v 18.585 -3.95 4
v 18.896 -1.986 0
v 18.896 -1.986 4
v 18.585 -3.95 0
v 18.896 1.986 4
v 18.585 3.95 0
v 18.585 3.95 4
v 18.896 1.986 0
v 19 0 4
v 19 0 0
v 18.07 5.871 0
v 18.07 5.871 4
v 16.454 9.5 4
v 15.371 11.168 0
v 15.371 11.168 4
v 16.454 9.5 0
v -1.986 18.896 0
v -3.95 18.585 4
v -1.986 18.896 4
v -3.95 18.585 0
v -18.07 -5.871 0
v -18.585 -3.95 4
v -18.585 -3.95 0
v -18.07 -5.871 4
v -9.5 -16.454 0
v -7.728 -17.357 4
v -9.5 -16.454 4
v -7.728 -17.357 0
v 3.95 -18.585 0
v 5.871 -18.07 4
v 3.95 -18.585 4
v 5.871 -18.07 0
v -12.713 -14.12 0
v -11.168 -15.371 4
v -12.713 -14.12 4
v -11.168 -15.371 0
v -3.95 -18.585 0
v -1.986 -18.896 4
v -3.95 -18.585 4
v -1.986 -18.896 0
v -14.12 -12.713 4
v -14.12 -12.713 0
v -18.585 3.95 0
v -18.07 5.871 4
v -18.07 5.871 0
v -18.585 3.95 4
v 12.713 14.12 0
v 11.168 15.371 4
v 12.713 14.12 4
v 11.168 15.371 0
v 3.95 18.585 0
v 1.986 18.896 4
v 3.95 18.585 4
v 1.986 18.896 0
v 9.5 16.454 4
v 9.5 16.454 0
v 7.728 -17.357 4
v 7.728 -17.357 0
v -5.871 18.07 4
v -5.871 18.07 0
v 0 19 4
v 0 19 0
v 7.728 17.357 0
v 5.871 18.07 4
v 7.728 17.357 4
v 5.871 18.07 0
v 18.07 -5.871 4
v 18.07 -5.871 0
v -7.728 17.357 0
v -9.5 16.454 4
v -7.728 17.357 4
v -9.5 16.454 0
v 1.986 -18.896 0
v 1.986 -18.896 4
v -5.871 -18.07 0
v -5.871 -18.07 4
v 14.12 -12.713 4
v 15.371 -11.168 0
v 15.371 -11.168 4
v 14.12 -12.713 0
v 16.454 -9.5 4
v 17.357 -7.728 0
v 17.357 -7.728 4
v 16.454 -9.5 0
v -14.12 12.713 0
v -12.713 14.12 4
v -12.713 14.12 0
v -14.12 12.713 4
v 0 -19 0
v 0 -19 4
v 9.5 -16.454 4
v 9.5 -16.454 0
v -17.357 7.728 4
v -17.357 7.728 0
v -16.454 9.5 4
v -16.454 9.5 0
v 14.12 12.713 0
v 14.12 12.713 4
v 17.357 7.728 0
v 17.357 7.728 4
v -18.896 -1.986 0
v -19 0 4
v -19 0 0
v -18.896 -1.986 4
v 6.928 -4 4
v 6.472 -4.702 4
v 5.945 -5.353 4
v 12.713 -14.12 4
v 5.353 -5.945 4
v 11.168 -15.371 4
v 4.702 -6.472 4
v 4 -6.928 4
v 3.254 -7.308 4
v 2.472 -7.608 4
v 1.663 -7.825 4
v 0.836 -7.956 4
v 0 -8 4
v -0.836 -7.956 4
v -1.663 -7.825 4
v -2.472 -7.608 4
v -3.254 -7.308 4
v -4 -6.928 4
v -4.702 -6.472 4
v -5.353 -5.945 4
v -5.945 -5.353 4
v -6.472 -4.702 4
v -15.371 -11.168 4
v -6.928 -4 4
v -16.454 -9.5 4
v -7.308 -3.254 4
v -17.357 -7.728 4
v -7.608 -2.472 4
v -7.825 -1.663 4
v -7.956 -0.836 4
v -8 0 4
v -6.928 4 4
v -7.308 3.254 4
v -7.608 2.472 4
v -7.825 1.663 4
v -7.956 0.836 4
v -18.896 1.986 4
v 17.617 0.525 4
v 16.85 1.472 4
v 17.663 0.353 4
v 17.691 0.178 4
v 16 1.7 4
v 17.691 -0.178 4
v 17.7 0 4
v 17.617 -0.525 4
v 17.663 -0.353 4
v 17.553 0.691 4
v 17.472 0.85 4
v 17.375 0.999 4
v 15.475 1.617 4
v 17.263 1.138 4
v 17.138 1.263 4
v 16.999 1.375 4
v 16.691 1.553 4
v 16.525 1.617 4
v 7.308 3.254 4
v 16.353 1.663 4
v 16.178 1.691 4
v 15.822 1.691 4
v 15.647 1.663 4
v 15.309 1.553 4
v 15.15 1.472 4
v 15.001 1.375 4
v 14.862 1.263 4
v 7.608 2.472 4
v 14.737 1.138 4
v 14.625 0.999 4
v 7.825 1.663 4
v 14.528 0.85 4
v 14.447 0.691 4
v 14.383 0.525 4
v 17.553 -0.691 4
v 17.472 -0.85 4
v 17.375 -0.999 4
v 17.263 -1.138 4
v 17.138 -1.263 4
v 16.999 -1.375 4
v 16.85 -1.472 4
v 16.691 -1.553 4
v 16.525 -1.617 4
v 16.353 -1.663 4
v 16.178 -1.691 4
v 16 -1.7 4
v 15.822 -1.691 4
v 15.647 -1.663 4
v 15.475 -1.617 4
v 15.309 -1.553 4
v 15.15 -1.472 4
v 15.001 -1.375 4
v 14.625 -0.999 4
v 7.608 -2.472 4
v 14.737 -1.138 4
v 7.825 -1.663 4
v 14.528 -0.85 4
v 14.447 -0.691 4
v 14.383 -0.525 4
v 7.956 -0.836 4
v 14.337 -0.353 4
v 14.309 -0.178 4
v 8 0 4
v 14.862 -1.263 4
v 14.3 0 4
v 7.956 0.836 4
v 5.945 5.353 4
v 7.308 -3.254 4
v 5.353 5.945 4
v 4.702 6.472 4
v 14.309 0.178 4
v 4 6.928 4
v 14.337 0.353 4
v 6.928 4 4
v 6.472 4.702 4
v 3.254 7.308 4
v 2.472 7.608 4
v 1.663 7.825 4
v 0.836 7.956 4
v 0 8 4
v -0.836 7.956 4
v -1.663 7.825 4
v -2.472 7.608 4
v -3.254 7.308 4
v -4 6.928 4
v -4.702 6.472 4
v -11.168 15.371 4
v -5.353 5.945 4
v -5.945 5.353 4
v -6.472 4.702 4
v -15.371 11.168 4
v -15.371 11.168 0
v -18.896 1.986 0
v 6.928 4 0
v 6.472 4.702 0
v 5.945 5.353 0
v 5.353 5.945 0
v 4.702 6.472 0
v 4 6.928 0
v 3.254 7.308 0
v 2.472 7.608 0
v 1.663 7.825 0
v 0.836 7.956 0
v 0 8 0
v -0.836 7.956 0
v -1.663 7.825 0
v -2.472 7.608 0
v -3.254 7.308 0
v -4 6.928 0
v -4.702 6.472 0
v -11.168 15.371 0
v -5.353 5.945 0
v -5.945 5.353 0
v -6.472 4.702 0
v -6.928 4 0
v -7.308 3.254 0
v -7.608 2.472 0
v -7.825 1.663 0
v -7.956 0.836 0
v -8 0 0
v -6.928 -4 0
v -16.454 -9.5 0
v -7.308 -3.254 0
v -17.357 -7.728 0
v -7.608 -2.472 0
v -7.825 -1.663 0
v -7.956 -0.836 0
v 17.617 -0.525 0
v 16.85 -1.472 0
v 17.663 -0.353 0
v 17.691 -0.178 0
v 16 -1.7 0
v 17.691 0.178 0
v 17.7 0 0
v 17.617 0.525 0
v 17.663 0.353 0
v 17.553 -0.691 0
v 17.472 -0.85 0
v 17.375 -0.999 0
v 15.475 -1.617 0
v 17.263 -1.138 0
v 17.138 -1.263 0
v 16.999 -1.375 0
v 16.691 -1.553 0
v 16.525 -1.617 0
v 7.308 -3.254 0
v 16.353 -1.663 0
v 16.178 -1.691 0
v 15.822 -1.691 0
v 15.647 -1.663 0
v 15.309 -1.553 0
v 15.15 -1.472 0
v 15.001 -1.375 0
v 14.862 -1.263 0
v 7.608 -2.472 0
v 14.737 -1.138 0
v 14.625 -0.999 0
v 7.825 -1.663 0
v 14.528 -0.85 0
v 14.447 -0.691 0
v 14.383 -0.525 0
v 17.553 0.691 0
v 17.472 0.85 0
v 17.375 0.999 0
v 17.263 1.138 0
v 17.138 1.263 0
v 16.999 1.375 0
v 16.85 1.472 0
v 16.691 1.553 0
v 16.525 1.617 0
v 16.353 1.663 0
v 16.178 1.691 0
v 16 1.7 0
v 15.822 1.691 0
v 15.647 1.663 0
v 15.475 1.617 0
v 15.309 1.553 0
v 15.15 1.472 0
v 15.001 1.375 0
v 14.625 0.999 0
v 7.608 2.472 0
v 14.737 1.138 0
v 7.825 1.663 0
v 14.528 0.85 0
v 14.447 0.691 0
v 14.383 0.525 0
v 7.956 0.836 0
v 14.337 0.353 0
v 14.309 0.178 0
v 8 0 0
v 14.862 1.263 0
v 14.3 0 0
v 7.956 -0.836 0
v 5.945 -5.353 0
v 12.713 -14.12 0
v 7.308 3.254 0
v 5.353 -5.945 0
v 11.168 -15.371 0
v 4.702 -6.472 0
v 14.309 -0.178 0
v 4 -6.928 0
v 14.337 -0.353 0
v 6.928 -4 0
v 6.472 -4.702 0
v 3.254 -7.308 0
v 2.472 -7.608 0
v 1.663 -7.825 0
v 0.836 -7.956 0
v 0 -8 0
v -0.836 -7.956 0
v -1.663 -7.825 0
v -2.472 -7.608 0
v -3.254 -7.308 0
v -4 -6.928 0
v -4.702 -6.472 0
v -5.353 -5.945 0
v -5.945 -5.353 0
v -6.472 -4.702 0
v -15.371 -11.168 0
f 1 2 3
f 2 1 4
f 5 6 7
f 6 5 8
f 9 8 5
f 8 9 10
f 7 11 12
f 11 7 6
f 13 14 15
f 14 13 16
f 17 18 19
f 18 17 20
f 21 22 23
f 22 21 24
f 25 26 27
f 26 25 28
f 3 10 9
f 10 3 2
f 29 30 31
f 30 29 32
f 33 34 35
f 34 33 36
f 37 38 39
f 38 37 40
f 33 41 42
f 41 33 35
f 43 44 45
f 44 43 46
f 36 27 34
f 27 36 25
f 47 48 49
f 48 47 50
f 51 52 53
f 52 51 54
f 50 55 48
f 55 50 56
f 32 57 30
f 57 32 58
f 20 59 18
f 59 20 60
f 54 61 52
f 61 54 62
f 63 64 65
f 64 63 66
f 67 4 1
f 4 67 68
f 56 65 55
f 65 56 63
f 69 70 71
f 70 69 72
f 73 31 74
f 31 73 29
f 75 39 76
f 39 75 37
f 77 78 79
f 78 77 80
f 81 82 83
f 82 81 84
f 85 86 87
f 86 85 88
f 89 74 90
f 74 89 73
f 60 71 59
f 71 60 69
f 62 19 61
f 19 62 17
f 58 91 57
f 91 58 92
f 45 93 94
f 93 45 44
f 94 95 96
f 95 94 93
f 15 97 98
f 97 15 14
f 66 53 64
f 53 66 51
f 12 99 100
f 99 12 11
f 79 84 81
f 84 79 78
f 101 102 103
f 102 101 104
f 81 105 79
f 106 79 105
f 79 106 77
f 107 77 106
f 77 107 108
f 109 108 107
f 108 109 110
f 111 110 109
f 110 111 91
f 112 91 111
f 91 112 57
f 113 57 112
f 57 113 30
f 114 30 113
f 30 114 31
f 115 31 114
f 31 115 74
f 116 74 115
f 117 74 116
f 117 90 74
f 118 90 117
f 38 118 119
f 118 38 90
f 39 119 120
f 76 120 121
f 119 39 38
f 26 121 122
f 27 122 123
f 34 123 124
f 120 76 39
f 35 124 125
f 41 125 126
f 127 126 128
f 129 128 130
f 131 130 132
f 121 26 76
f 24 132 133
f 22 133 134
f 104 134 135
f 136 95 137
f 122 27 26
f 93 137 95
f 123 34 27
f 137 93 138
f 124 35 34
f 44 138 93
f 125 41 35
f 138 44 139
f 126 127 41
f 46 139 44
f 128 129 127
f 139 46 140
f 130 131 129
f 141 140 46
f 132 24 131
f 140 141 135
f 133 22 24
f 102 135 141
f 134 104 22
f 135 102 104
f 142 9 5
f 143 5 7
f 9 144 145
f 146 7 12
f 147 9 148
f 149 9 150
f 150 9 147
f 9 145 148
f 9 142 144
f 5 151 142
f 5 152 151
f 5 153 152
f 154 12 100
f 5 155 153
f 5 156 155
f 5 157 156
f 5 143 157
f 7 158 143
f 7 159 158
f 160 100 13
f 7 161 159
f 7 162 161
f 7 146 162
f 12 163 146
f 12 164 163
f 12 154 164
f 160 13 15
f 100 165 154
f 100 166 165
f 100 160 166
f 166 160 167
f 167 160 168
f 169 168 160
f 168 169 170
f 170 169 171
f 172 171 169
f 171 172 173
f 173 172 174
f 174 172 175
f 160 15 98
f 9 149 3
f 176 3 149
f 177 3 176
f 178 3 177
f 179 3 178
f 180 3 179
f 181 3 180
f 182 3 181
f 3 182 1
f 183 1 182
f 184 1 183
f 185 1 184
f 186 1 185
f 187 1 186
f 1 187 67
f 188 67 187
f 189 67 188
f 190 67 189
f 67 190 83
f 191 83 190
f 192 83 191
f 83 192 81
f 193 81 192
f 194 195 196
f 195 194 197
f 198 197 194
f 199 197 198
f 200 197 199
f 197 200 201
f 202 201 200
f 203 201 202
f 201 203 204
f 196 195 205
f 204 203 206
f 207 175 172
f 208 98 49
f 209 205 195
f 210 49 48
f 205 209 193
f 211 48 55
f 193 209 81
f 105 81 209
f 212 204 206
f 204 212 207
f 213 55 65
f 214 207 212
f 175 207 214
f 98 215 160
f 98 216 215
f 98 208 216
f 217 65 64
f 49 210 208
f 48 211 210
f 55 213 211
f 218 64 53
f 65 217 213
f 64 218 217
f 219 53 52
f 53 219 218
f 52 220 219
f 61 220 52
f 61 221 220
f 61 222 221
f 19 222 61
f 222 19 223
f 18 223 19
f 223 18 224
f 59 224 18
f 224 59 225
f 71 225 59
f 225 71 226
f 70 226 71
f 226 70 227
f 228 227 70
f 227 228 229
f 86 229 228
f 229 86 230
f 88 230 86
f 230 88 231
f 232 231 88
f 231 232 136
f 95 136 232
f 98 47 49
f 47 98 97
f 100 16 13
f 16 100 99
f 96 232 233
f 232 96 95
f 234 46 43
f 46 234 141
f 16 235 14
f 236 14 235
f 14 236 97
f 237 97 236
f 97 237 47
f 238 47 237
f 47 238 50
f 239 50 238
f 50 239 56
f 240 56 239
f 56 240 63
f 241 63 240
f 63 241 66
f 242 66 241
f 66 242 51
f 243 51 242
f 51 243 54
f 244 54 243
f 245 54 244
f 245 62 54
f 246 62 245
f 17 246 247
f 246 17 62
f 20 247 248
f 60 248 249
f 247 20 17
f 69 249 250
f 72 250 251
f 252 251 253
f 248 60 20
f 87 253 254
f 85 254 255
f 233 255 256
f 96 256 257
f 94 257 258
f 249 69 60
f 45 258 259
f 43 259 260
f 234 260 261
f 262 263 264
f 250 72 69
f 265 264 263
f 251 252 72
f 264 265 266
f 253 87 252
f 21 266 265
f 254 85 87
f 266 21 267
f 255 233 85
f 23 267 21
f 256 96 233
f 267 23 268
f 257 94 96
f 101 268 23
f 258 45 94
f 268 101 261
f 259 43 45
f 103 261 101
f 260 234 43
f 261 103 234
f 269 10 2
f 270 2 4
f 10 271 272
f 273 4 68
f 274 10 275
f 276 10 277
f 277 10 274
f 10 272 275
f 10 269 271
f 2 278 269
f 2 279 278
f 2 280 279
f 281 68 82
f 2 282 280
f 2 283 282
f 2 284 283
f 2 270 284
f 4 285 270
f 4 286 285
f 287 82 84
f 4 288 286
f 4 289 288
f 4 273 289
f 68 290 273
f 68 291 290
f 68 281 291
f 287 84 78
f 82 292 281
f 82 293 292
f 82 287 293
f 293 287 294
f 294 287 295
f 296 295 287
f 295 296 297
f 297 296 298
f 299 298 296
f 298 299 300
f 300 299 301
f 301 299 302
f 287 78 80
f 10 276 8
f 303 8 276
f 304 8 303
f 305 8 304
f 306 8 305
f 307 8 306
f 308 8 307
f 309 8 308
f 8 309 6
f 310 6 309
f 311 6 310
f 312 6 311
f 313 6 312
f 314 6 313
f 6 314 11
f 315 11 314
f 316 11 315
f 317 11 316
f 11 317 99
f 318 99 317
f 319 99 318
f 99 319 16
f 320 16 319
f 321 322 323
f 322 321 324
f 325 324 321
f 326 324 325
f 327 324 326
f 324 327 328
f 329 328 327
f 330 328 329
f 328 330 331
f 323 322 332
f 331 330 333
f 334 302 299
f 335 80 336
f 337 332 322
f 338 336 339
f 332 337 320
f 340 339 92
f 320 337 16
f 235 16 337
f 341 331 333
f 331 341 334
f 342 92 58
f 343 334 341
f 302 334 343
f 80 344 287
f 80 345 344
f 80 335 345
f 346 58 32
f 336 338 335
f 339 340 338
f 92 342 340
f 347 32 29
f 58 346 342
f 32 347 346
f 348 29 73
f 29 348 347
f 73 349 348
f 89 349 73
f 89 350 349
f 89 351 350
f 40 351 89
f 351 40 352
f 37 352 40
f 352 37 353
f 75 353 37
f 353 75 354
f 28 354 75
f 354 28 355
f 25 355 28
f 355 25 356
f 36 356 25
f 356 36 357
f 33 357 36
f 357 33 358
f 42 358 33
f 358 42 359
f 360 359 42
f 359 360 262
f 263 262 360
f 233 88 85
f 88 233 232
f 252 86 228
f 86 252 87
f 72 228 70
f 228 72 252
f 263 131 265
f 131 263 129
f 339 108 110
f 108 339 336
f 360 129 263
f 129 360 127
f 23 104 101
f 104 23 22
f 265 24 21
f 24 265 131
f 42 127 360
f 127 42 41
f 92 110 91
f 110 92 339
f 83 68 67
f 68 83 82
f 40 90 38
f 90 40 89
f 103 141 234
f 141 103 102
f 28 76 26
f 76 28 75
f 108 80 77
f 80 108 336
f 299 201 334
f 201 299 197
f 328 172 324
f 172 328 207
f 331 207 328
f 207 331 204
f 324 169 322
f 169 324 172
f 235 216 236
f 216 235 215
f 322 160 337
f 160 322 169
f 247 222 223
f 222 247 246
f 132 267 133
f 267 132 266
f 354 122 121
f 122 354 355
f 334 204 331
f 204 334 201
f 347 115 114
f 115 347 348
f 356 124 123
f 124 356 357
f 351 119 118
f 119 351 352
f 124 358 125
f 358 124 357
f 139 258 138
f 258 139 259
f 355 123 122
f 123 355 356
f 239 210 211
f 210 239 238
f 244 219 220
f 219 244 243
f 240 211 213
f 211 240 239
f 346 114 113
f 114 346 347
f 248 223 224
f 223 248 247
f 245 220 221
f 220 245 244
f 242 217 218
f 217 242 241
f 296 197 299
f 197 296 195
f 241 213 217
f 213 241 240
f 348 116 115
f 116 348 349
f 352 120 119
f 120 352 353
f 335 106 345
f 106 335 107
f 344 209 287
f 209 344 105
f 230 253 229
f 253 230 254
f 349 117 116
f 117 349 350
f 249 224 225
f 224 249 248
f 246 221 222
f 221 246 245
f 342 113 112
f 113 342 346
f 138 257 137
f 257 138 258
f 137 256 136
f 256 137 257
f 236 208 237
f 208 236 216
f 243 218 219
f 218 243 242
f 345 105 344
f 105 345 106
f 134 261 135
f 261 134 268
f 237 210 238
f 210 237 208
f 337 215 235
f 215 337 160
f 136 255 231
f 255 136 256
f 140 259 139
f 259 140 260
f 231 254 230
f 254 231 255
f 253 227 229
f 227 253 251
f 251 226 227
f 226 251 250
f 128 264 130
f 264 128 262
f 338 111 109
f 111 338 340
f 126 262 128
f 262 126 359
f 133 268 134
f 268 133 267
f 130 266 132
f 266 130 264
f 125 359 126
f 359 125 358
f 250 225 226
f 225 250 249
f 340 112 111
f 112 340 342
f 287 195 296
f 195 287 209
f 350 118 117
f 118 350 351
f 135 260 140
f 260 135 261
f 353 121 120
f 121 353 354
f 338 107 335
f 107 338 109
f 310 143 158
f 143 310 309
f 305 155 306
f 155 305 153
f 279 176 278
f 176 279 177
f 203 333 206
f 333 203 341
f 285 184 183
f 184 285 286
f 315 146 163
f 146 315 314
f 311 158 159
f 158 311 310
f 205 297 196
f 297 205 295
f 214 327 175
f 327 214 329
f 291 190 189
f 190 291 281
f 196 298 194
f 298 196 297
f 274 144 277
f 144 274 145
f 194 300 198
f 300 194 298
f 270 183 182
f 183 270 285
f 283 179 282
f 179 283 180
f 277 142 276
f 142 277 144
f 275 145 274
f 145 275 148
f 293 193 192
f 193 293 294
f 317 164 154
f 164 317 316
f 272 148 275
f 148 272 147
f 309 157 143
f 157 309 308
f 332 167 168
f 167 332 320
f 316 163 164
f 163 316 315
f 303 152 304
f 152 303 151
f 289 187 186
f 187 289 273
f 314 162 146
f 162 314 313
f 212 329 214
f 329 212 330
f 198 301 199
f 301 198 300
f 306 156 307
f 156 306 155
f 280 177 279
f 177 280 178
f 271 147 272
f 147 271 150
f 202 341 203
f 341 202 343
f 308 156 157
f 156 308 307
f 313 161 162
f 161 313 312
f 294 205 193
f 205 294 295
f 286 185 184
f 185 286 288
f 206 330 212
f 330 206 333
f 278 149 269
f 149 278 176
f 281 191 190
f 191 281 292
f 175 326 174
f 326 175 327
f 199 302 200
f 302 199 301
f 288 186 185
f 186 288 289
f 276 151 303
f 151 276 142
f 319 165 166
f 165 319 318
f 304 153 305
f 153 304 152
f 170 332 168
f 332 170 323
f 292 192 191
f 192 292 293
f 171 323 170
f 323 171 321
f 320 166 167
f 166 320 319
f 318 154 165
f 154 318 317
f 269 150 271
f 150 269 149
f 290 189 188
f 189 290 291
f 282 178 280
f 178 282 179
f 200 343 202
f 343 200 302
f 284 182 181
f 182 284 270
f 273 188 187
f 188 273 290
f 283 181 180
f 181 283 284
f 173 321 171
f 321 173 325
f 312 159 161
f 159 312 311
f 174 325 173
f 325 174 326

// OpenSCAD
// Closed cable guide ring.
$fn = 60;
eps = 0.02;
cable_d = 16;
outer_d = 38;
thickness = 4;
difference() { cylinder(d=outer_d,h=thickness); translate([0,0,-eps]) cylinder(d=cable_d,h=thickness+2*eps); translate([outer_d/2-3,0,-eps]) cylinder(d=3.4,h=thickness+2*eps); }
